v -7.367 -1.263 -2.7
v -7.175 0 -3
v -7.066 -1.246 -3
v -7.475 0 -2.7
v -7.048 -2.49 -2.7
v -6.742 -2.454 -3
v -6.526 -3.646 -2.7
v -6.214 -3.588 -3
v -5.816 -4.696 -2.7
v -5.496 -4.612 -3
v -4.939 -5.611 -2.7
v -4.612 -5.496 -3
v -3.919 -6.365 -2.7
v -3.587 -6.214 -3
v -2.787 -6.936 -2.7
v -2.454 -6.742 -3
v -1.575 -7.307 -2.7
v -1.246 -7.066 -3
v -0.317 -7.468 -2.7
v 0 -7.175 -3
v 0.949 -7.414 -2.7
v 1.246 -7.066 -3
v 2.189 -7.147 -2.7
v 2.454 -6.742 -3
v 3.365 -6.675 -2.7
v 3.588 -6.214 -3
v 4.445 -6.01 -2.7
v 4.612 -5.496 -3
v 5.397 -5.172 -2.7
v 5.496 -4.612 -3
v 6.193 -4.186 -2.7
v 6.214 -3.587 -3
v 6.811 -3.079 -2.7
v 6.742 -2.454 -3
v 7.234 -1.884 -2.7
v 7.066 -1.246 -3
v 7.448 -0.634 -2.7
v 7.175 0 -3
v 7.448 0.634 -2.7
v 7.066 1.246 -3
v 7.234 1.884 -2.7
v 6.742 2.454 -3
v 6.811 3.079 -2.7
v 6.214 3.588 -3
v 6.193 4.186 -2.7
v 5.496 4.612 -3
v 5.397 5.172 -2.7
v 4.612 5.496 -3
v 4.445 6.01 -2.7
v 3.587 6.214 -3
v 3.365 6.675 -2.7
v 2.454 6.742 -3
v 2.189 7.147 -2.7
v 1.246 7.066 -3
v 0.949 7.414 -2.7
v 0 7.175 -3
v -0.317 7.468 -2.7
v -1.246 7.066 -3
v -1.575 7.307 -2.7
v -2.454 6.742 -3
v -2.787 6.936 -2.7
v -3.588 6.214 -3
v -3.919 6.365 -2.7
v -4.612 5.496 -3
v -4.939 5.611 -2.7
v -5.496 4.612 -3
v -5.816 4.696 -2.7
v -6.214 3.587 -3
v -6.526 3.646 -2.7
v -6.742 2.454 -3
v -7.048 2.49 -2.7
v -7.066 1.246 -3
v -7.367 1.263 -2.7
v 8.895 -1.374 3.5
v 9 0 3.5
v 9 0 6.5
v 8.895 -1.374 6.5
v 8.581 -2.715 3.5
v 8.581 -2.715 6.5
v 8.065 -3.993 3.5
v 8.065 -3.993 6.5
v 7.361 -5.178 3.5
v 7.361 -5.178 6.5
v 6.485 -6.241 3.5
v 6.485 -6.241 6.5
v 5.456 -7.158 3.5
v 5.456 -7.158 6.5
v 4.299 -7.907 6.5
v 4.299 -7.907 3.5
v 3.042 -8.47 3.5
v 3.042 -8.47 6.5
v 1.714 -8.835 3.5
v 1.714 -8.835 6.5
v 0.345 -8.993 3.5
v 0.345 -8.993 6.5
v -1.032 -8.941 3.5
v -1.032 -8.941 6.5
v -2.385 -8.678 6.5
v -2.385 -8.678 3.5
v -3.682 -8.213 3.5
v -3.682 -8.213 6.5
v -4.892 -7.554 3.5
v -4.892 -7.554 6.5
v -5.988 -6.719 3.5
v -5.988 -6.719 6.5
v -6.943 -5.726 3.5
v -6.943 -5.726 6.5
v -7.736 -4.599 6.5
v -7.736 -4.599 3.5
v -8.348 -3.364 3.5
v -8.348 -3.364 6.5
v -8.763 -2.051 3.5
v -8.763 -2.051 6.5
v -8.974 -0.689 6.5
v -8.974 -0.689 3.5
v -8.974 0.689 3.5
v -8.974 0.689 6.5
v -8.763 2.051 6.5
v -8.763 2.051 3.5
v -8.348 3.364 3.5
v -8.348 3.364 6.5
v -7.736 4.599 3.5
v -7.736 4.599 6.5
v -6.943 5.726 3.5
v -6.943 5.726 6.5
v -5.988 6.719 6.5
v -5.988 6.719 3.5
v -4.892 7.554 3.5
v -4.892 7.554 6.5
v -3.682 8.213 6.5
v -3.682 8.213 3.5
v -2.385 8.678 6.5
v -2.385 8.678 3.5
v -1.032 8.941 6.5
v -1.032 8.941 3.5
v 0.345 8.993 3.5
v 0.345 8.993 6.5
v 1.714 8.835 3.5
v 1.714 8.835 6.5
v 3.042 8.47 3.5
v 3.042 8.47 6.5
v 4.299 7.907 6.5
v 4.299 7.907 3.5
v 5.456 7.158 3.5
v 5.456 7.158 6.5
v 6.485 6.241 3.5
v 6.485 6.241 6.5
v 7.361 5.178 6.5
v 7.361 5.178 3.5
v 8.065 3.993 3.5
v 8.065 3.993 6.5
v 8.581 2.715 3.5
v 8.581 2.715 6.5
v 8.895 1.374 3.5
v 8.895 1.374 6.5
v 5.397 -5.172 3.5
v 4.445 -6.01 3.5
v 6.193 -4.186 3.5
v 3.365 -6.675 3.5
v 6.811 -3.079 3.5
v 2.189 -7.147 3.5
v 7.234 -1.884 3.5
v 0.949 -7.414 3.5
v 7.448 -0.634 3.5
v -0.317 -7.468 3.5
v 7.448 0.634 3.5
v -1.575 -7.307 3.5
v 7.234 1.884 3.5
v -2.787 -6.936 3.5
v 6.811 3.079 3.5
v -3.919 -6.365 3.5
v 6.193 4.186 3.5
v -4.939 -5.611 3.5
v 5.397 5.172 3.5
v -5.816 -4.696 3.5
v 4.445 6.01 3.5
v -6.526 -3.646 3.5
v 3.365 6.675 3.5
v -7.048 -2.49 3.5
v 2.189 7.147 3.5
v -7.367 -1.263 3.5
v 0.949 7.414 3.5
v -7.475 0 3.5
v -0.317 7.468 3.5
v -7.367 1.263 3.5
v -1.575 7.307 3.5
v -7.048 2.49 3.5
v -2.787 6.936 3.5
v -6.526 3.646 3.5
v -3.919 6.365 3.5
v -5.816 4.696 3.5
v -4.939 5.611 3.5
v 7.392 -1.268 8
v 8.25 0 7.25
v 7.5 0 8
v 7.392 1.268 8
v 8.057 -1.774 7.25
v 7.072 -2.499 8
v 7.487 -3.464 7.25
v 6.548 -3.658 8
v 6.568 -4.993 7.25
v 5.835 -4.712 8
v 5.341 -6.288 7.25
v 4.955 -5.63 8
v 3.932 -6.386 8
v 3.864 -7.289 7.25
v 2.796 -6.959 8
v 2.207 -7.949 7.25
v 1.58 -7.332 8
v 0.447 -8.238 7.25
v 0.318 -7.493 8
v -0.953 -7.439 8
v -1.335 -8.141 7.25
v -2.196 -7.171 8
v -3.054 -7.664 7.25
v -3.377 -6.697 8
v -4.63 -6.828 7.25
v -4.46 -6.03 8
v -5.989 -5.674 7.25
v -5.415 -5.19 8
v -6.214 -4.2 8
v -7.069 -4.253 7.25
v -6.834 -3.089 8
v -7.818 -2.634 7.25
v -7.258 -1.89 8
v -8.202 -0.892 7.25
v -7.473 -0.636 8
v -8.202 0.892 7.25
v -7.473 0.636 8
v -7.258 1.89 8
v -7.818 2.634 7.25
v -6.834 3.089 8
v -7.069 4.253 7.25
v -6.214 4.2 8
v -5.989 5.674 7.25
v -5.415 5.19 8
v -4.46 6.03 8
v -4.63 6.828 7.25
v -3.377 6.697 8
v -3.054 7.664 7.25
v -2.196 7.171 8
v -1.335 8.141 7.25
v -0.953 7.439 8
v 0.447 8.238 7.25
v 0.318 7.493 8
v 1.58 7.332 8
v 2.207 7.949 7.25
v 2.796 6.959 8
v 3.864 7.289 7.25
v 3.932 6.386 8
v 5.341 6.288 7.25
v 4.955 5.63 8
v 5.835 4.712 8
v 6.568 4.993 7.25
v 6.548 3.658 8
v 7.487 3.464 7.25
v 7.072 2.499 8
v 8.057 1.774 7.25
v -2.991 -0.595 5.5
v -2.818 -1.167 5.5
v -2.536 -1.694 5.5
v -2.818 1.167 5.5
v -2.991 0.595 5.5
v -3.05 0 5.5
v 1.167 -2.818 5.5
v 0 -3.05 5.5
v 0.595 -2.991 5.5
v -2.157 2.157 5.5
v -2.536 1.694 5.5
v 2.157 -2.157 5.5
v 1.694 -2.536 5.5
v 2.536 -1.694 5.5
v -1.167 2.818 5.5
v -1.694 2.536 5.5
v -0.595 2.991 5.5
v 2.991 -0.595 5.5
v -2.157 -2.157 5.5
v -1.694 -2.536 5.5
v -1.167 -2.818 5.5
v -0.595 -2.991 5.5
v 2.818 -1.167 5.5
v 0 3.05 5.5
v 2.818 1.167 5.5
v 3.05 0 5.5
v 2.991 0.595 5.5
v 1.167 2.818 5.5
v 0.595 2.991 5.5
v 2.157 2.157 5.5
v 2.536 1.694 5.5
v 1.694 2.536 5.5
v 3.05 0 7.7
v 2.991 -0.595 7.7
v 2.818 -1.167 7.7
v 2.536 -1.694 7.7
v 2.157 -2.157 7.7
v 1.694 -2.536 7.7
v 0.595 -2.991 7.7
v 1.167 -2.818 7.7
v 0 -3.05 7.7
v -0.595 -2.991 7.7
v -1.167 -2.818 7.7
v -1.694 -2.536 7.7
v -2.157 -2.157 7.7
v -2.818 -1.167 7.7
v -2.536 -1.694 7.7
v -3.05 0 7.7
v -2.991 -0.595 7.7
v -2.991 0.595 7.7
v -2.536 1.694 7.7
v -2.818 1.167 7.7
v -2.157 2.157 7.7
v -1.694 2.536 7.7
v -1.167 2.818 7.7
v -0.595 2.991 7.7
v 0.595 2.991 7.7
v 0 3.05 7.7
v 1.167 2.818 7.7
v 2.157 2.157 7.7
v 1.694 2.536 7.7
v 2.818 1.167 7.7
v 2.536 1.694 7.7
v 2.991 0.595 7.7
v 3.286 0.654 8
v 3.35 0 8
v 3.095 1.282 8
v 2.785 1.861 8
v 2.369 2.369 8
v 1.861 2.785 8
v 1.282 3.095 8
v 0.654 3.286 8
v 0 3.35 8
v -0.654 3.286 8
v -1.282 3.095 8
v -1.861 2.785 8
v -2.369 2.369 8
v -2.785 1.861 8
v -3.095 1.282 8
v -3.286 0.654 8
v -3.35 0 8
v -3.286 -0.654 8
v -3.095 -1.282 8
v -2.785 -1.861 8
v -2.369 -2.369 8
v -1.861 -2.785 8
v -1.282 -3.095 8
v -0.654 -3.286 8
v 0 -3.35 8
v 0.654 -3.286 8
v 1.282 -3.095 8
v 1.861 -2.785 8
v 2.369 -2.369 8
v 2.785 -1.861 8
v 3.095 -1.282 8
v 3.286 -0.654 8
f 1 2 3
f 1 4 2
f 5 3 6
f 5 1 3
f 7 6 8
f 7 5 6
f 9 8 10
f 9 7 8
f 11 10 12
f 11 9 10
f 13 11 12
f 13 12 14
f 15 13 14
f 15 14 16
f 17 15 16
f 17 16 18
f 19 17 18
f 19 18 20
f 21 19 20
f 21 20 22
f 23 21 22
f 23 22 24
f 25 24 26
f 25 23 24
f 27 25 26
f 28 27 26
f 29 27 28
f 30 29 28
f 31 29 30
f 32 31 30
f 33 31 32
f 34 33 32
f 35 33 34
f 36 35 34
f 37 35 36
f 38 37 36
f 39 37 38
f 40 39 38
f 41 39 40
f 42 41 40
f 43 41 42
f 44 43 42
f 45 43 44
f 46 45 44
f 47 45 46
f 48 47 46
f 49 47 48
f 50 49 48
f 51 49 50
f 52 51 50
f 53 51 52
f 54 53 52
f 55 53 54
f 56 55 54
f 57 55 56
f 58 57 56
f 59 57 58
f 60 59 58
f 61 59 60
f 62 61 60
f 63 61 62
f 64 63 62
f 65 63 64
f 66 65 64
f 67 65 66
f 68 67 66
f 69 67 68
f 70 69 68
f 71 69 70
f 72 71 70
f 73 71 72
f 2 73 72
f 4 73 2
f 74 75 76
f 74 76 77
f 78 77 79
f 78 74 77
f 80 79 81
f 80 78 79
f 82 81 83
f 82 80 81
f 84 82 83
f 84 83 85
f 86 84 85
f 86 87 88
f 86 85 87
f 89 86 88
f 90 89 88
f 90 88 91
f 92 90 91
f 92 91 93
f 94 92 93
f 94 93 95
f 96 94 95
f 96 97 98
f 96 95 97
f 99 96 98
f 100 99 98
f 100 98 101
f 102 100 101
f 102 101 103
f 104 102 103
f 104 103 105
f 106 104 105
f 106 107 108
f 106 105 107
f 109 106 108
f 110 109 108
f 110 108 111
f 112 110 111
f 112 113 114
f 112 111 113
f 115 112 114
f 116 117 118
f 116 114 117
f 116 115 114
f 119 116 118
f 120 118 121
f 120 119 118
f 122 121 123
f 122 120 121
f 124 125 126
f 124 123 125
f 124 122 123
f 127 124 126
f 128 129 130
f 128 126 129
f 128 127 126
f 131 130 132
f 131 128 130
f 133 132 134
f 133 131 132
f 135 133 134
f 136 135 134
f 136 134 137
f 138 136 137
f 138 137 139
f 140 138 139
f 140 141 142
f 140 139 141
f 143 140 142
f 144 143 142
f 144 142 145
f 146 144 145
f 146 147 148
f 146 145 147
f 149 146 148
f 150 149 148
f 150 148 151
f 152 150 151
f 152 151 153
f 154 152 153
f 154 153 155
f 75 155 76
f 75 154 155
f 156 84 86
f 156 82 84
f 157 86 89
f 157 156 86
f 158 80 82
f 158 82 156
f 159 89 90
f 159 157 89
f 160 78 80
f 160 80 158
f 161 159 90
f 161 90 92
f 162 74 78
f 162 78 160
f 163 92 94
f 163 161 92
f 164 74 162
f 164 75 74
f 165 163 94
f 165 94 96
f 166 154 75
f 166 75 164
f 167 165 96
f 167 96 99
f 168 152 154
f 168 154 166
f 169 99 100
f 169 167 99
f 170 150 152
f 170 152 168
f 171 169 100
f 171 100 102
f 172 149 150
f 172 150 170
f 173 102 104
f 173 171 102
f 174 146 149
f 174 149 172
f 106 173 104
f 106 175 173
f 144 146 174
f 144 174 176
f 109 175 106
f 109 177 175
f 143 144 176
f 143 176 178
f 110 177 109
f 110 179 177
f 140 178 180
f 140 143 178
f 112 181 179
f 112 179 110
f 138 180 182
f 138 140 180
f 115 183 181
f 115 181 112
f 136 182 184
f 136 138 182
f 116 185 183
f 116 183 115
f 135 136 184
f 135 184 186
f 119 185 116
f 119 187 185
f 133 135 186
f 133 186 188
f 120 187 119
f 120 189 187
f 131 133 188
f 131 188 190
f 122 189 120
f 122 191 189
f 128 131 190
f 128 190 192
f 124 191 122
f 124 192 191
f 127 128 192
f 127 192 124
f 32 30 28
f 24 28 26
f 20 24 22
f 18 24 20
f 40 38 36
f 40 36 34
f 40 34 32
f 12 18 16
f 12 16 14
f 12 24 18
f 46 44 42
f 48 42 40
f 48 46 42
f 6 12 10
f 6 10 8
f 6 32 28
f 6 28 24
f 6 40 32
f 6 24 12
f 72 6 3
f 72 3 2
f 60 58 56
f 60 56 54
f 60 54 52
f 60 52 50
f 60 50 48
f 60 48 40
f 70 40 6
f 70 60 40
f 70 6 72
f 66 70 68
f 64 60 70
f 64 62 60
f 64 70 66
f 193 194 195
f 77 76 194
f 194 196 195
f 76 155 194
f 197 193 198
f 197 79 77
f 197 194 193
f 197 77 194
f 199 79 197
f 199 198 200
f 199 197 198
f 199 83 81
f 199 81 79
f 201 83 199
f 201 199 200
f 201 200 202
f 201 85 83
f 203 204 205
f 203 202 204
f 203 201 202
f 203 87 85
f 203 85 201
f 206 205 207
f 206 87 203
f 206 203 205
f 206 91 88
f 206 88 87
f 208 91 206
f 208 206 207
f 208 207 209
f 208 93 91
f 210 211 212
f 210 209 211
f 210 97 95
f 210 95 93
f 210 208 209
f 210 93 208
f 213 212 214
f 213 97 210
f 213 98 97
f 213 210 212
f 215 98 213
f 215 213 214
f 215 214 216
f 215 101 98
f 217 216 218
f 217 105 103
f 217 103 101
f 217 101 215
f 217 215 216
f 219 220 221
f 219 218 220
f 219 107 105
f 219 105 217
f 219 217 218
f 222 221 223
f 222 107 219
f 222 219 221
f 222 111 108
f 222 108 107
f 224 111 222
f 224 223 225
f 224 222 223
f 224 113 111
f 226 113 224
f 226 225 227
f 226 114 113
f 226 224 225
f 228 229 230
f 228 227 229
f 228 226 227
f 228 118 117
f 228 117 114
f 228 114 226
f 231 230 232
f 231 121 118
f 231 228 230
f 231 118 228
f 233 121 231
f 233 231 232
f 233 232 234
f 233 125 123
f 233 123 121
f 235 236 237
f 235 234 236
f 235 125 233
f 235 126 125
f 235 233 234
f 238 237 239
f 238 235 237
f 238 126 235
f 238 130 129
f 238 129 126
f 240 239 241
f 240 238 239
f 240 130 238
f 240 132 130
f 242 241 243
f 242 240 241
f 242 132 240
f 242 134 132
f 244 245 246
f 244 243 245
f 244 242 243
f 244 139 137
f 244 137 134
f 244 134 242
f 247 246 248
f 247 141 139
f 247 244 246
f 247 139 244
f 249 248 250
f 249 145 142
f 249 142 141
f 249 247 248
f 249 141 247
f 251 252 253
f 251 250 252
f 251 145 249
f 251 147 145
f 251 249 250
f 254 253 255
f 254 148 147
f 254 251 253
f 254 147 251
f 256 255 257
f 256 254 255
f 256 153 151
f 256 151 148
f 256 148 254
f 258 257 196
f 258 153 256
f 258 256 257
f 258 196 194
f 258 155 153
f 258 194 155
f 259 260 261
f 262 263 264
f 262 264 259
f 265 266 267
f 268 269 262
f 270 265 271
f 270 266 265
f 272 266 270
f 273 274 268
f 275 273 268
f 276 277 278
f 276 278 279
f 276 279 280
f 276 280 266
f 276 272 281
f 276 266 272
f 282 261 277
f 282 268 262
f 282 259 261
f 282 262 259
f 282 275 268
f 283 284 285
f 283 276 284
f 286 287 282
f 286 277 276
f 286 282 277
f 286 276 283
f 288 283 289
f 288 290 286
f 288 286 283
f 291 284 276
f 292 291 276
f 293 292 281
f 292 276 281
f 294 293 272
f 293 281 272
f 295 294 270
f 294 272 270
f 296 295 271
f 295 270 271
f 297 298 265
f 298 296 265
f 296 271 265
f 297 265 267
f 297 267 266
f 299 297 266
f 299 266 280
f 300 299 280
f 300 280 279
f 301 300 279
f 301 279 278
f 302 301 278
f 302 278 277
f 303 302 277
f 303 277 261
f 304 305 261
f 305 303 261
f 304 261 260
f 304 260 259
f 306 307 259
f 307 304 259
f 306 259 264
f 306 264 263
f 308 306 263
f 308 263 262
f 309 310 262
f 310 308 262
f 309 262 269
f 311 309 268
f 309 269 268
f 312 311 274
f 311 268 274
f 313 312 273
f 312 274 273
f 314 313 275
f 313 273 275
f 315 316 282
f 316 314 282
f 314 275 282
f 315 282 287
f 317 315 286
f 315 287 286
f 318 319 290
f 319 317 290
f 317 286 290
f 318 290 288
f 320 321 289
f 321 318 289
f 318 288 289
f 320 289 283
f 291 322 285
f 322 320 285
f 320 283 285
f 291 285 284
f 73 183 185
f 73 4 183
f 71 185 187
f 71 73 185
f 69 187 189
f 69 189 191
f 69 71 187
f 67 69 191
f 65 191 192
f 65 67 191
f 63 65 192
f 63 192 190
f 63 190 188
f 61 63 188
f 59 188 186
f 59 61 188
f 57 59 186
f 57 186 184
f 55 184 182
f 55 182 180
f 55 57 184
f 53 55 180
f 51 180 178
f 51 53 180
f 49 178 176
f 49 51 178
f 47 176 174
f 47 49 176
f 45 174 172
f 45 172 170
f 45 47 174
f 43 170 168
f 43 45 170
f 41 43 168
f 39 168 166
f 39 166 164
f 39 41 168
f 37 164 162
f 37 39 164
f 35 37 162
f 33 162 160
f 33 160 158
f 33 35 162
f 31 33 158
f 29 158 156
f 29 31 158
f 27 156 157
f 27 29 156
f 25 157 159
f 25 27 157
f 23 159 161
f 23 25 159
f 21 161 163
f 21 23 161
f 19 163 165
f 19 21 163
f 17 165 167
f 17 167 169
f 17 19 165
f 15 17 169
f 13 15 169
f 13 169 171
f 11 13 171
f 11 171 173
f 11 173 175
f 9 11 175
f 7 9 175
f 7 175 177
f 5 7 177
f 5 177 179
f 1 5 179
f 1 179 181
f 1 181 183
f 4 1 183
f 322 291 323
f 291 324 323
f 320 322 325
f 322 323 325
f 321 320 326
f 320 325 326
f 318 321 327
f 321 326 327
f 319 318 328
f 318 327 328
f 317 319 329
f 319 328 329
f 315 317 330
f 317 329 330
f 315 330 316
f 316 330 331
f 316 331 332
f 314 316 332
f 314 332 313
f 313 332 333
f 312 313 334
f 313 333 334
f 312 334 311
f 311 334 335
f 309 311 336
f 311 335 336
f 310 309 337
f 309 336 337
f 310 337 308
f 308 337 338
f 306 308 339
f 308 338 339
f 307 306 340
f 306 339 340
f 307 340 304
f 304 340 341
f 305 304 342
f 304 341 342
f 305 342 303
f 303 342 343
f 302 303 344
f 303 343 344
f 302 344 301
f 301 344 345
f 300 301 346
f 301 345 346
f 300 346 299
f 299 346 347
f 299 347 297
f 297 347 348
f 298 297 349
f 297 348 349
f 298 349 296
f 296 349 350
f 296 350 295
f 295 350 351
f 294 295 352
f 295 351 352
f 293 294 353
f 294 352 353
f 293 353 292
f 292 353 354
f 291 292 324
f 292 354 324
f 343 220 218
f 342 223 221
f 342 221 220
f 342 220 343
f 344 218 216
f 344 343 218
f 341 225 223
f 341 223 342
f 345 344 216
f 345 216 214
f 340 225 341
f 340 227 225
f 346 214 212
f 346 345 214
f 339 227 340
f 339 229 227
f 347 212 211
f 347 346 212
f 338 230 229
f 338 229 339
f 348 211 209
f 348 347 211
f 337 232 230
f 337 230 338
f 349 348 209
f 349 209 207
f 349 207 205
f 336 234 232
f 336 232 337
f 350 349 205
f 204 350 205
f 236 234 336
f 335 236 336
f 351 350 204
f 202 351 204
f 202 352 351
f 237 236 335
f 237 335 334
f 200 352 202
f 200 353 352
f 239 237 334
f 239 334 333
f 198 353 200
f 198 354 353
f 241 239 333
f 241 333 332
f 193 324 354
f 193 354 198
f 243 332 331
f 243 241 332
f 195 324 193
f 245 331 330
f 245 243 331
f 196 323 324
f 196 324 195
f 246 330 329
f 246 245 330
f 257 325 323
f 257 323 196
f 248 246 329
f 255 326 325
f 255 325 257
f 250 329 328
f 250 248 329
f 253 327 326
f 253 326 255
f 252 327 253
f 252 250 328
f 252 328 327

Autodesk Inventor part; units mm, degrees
ref_plane "YZ Plane" through (0, 0, 0) normal (1, 0, 0) x (0, 1, 0)
ref_plane "XZ Plane" through (0, 0, 0) normal (0, 1, 0) x (-1, 0, 0)
ref_plane "XY Plane" through (0, 0, 0) normal (0, 0, 1) x (1, 0, 0)
sketch "Sketch1" plane through (0, 0, 0) normal (0, 0, 1) x (1, 0, 0)
  circle A0 centre (0, 0) radius 9
  dimension "d0" = 18
extrude "Extrusion1" add sketch "Sketch1" along normal blind 4
sketch "Sketch3" plane through (0, 0, 4) normal (0, 0, 1) x (1, 0, 0)
  circle A0 centre (0, 0) radius 3.05
  dimension "d5" = 6.1
extrude "Extrusion3" cut sketch "Sketch3" against normal blind 2.5
sketch "Sketch4" plane through (0, 0, 0) normal (0, 0, -1) x (-1, 0, 0)
  circle A0 centre (0, 0) radius 9 projected
  circle A1 centre (0, 0) radius 7.475
  dimension "d8" = 14.95
extrude "Extrusion4" cut sketch "Sketch4" against normal blind 3.5
sketch "Sketch5" plane through (0, 0, 4) normal (0, 0, 1) x (1, 0, 0)
  circle A0 centre (0, 0) radius 3.05 projected
  circle A1 centre (0, 0) radius 9 projected
extrude "Extrusion5" add sketch "Sketch5" along normal blind 1
sketch "Sketch6" plane through (0, 0, 5) normal (0, 0, 1) x (1, 0, 0)
  circle A0 centre (0, 0) radius 7.475 projected
  circle A1 centre (0, 0) radius 9 projected
  circle A2 centre (0, 0) radius 3.05 projected
extrude "Extrusion6" add sketch "Sketch6" along normal blind 3 contours A0 | A1
sketch "Sketch7" plane through (0, 0, 0) normal (0, 0, -1) x (-1, 0, 0)
  circle A0 centre (0, 0) radius 7.475 projected
extrude "Extrusion7" add sketch "Sketch7" along normal blind 3
sketch "Sketch8" plane through (0, 0, 1.5) normal (0, 0, 1) x (1, 0, 0)
  circle A0 centre (0, 0) radius 3.05 projected
extrude "Extrusion8" add sketch "Sketch8" along normal blind 4
chamfer "Chamfer4" distance 1.5 angle 45 1 edges at (-9, 0, 8)
chamfer "Chamfer5" distance 0.3 angle 45 2 edges at (7.475, 0, -3) (-3.05, 0, 8)
properties part number "encoder_magnet_holder" material "PET Plastic"
